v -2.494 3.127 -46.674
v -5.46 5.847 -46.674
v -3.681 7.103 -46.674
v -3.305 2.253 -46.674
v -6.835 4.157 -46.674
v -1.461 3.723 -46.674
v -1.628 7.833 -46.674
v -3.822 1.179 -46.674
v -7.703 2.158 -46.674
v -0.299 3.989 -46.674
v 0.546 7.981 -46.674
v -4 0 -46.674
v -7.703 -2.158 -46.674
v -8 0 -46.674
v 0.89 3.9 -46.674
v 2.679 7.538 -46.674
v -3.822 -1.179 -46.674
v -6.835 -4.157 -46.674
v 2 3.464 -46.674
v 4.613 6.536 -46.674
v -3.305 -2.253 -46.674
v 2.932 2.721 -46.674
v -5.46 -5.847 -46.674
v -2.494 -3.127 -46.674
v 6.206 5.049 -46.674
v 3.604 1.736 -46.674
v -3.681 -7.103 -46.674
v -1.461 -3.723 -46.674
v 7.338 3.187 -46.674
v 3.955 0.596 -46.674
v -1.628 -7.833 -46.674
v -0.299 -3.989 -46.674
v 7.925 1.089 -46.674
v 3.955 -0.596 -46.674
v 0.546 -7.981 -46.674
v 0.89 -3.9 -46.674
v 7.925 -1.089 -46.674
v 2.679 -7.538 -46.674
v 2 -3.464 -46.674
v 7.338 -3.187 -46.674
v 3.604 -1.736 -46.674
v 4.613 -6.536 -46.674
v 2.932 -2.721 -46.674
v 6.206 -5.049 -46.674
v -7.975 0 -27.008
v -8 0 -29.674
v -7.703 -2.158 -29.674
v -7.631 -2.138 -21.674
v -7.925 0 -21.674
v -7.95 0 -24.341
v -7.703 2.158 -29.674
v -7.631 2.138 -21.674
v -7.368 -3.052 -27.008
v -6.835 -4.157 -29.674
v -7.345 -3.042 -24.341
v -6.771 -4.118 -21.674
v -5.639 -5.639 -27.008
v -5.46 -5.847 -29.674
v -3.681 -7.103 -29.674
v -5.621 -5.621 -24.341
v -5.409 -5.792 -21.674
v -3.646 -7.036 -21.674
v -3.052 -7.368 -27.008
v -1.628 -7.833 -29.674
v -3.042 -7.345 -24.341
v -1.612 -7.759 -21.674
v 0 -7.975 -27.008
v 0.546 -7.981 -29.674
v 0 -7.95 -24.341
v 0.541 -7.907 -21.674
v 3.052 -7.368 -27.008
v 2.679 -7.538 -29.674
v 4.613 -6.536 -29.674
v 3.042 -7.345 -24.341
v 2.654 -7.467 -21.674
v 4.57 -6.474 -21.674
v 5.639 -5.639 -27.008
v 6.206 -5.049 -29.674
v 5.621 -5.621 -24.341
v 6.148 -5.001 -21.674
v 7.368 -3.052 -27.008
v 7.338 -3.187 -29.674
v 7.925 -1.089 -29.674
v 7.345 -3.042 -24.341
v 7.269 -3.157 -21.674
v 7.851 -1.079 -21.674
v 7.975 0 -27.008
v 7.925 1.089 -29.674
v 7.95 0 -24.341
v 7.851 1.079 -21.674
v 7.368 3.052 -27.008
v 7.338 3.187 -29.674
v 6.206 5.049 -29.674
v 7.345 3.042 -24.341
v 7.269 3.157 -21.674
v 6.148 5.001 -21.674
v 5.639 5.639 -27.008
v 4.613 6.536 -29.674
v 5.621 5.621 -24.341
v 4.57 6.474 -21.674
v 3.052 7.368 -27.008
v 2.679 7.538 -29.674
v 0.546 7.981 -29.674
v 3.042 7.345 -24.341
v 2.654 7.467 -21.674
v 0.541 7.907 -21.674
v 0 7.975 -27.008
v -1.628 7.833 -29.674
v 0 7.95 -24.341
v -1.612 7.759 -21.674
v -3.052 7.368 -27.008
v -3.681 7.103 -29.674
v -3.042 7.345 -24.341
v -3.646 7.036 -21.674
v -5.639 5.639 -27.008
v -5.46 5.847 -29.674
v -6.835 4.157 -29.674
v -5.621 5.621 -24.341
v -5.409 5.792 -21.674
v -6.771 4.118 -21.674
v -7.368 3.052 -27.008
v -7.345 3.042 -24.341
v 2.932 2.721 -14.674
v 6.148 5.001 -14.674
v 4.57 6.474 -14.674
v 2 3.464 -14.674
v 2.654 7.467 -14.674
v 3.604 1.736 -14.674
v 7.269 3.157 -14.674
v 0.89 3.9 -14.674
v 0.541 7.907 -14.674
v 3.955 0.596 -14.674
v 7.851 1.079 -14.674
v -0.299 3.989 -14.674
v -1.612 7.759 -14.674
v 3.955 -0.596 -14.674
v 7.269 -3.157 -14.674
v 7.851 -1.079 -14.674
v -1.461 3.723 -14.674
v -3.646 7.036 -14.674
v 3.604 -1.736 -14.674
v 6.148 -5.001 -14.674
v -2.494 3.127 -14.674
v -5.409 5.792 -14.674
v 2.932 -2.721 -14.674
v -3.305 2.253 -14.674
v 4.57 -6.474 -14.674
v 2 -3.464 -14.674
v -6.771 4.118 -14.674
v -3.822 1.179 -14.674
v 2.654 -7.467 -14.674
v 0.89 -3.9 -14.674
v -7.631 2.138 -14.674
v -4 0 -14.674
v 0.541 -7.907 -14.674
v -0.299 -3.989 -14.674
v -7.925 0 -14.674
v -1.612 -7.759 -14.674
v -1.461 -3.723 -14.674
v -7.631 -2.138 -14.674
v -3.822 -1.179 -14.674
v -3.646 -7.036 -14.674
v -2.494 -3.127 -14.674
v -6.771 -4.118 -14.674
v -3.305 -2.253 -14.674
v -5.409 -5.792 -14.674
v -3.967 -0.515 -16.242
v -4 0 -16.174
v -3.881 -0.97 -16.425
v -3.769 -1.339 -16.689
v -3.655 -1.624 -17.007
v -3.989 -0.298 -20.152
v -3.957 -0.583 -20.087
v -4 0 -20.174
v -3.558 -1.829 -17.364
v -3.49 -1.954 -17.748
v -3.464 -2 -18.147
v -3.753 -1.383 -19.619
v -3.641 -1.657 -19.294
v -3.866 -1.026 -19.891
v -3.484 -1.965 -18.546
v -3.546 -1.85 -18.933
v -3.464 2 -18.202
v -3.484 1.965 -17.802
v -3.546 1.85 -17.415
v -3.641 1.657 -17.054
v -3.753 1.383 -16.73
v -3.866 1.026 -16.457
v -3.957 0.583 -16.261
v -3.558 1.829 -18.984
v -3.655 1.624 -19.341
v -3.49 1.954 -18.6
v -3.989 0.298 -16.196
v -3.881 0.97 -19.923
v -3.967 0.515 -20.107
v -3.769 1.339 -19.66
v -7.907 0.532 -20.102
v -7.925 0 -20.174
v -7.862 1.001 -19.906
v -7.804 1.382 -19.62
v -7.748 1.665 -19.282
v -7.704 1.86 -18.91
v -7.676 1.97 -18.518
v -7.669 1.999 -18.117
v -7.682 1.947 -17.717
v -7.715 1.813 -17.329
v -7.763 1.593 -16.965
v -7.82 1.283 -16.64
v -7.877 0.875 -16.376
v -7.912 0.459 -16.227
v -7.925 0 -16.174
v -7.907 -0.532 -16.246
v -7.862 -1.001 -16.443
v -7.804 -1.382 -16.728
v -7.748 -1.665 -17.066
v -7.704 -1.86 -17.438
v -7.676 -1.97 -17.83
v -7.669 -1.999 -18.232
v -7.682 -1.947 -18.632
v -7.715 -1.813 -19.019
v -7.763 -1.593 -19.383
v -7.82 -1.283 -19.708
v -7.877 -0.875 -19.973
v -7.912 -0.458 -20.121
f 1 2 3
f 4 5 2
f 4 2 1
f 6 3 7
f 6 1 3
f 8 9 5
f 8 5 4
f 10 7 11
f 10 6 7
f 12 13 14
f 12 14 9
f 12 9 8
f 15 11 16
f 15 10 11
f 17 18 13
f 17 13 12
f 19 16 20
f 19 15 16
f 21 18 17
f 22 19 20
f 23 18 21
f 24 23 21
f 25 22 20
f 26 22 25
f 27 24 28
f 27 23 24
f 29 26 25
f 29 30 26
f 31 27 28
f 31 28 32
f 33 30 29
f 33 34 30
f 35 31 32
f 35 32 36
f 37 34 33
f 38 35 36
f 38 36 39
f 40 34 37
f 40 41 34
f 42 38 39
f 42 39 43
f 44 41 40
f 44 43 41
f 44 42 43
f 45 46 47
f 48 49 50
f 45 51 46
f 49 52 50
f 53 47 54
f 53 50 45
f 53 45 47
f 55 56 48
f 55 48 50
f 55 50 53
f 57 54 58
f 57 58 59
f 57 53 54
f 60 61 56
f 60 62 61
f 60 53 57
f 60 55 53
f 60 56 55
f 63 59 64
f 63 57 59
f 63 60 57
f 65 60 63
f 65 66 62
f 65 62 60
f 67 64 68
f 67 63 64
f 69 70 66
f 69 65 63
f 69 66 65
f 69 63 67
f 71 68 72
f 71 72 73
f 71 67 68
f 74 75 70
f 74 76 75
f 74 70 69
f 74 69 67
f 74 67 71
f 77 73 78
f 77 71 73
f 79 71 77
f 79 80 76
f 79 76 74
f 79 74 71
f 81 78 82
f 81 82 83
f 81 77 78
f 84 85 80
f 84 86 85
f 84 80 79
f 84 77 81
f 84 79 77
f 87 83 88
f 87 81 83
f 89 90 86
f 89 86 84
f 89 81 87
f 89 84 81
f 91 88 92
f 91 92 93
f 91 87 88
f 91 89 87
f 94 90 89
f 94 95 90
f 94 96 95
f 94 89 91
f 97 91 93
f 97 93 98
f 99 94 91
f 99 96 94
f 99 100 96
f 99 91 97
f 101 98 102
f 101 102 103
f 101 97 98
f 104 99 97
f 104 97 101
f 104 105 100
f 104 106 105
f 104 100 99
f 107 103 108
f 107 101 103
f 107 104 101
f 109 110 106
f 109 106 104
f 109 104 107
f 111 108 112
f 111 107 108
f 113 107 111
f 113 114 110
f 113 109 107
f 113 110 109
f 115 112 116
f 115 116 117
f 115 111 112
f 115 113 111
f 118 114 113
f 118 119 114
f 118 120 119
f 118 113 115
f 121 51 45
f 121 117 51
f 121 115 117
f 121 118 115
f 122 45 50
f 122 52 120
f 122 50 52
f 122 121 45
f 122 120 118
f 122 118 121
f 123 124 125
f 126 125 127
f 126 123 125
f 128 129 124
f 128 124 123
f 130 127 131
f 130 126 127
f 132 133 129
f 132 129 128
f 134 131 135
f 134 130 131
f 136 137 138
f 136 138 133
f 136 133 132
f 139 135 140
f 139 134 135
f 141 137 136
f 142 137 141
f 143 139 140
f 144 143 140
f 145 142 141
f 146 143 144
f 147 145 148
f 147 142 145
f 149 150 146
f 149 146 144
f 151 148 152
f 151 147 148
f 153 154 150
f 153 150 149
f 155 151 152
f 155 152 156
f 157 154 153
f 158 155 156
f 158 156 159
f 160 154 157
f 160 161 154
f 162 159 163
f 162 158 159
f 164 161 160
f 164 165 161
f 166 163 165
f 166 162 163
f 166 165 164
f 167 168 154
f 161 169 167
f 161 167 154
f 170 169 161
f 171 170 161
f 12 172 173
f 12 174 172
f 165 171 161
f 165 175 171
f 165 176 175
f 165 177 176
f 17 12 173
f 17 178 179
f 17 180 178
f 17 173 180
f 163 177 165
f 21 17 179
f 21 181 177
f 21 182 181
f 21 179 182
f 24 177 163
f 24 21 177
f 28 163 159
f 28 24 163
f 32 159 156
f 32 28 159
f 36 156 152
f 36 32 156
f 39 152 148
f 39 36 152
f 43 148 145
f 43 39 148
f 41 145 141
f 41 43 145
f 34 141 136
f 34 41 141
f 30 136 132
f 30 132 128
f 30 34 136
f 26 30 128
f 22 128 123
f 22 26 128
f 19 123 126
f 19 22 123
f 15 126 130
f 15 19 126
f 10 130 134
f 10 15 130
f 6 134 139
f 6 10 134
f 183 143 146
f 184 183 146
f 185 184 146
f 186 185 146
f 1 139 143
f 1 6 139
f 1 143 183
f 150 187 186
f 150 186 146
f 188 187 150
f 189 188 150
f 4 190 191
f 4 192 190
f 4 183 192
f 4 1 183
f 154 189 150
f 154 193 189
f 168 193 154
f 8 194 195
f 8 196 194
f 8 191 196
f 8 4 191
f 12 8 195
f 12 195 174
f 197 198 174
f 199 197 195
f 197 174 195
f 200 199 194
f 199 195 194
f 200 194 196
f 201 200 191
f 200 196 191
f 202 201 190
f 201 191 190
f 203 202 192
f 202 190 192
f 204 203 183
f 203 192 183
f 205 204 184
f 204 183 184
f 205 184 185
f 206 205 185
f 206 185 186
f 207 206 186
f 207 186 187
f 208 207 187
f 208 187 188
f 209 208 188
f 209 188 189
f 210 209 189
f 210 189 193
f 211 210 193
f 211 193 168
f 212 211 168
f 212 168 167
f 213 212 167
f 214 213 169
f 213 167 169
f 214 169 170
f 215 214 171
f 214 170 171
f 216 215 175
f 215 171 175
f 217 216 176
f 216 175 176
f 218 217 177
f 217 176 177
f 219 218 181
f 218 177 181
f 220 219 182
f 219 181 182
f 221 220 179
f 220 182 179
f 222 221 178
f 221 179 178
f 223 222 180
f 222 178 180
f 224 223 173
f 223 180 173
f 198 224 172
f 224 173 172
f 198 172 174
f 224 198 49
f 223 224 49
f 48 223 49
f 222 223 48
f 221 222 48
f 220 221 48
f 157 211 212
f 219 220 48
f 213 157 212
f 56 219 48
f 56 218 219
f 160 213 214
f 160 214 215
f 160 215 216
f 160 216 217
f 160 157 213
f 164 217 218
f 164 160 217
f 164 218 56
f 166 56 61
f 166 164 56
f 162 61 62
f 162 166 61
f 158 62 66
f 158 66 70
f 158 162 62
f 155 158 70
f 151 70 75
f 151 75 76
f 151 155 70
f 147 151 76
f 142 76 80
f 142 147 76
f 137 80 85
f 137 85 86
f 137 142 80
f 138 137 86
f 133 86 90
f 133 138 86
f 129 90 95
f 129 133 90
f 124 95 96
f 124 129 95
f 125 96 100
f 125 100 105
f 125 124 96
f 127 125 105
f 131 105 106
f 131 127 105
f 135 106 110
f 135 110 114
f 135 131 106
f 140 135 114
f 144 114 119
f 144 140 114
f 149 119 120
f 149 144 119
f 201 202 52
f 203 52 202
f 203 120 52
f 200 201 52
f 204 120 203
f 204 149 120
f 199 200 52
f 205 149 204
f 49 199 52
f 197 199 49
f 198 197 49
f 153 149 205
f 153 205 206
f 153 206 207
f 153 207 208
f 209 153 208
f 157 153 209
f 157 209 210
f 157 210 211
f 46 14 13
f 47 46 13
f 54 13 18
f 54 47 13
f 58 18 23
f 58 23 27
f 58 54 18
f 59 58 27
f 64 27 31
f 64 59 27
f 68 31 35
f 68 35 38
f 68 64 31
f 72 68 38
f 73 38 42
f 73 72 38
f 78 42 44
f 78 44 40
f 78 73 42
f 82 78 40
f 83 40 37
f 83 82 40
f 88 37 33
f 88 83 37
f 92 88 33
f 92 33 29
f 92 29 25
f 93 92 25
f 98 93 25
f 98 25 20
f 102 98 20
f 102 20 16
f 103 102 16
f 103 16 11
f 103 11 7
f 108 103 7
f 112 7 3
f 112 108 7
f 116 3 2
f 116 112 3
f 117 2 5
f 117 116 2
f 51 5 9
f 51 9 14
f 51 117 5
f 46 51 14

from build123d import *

# Parameters (mm, degrees)
SCHIZZO2_R               = 2
TAGLIO_ESTRUSIONE1_DEPTH = 49.025821347


with BuildPart() as part:
    # Schizzo1 → Rivoluzione1 (revolve)
    with BuildSketch(Plane(origin=(0, 0, 0), x_dir=(1, 0, 0), z_dir=(0, 1, 0)), mode=Mode.PRIVATE) as rivoluzione1_sk:
        Polygon((4, 46.674184686), (8, 46.674184686), (8, 29.674184686), (7.925, 21.674184686), (7.925, 14.674184686), (4, 14.674184686), align=None)
    revolve(rivoluzione1_sk.sketch.rotate(Axis((0, 0, -88.99), (0, 0, 1)), 180), axis=Axis((0, 0, -88.99), (0, 0, 1)))

    # Schizzo2 → Taglio-Estrusione1 (cut, through all)
    with BuildSketch(Plane(origin=(0, 0, 0), x_dir=(0, 0, -1), z_dir=(1, 0, 0))):
        with Locations((18.174184686, 0)):
            Circle(SCHIZZO2_R)
    extrude(amount=-TAGLIO_ESTRUSIONE1_DEPTH, mode=Mode.SUBTRACT)


solid = part.part
